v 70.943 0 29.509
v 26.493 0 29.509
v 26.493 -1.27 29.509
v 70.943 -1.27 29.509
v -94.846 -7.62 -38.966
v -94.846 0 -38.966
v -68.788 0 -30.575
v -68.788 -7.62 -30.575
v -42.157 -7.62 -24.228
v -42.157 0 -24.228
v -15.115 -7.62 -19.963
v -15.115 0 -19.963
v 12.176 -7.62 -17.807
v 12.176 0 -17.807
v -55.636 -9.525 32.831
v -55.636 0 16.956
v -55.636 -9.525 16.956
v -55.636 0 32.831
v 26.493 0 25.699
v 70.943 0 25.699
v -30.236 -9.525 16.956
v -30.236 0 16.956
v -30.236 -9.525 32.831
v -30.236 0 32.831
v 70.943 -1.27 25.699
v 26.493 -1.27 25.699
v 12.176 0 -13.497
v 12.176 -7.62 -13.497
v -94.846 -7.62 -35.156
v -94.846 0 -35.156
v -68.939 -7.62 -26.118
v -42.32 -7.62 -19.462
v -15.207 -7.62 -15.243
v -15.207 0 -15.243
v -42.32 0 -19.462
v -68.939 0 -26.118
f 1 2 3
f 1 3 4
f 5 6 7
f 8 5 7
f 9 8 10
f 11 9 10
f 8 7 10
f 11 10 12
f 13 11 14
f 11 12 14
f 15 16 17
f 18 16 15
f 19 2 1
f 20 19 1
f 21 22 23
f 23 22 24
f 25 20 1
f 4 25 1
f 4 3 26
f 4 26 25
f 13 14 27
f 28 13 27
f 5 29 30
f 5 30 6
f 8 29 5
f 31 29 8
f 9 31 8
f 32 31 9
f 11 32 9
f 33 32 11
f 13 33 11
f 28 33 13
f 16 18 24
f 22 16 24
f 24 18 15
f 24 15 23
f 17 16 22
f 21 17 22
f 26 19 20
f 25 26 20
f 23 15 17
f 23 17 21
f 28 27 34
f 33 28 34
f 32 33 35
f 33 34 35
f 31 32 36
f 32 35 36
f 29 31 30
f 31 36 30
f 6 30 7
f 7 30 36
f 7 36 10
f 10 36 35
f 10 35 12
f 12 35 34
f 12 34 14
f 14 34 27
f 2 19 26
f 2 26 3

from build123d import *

# Parameters (mm, degrees)
F0_W     = 25.4
F0_H     = 15.875
F1_DEPTH = 9.525
F2_W     = 44.45
F2_H     = 3.81
F3_DEPTH = 1.27
F5_DEPTH = 7.62


with BuildPart() as f1:
    # F0 (on Front) → F1 (new body)
    with BuildSketch(Plane.XZ):
        with Locations((-42.936093, 24.893261)):
            Rectangle(F0_W, F0_H)
    extrude(amount=F1_DEPTH)


with BuildPart() as f3:
    # F2 (on Front) → F3 (new body)
    with BuildSketch(Plane.XZ):
        with Locations((48.718376, 27.603576)):
            Rectangle(F2_W, F2_H)
    extrude(amount=F3_DEPTH)


with BuildPart() as f5:
    # F4 (on Front) → F5 (new body)
    with BuildSketch(Plane.XZ):
        with BuildLine():
            Line((-94.846293, -35.155985), (-94.846293, -38.965985))
            ThreePointArc((-94.846293, -38.965985), (-42.157335, -24.227862), (12.176002, -17.807032))
            Line((12.176002, -17.807032), (12.176002, -13.496675))
            ThreePointArc((12.176002, -13.496675), (-42.319613, -19.461912), (-94.846293, -35.155985))
        make_face()
    extrude(amount=F5_DEPTH)


solid = Compound([f1.part, f3.part, f5.part])
